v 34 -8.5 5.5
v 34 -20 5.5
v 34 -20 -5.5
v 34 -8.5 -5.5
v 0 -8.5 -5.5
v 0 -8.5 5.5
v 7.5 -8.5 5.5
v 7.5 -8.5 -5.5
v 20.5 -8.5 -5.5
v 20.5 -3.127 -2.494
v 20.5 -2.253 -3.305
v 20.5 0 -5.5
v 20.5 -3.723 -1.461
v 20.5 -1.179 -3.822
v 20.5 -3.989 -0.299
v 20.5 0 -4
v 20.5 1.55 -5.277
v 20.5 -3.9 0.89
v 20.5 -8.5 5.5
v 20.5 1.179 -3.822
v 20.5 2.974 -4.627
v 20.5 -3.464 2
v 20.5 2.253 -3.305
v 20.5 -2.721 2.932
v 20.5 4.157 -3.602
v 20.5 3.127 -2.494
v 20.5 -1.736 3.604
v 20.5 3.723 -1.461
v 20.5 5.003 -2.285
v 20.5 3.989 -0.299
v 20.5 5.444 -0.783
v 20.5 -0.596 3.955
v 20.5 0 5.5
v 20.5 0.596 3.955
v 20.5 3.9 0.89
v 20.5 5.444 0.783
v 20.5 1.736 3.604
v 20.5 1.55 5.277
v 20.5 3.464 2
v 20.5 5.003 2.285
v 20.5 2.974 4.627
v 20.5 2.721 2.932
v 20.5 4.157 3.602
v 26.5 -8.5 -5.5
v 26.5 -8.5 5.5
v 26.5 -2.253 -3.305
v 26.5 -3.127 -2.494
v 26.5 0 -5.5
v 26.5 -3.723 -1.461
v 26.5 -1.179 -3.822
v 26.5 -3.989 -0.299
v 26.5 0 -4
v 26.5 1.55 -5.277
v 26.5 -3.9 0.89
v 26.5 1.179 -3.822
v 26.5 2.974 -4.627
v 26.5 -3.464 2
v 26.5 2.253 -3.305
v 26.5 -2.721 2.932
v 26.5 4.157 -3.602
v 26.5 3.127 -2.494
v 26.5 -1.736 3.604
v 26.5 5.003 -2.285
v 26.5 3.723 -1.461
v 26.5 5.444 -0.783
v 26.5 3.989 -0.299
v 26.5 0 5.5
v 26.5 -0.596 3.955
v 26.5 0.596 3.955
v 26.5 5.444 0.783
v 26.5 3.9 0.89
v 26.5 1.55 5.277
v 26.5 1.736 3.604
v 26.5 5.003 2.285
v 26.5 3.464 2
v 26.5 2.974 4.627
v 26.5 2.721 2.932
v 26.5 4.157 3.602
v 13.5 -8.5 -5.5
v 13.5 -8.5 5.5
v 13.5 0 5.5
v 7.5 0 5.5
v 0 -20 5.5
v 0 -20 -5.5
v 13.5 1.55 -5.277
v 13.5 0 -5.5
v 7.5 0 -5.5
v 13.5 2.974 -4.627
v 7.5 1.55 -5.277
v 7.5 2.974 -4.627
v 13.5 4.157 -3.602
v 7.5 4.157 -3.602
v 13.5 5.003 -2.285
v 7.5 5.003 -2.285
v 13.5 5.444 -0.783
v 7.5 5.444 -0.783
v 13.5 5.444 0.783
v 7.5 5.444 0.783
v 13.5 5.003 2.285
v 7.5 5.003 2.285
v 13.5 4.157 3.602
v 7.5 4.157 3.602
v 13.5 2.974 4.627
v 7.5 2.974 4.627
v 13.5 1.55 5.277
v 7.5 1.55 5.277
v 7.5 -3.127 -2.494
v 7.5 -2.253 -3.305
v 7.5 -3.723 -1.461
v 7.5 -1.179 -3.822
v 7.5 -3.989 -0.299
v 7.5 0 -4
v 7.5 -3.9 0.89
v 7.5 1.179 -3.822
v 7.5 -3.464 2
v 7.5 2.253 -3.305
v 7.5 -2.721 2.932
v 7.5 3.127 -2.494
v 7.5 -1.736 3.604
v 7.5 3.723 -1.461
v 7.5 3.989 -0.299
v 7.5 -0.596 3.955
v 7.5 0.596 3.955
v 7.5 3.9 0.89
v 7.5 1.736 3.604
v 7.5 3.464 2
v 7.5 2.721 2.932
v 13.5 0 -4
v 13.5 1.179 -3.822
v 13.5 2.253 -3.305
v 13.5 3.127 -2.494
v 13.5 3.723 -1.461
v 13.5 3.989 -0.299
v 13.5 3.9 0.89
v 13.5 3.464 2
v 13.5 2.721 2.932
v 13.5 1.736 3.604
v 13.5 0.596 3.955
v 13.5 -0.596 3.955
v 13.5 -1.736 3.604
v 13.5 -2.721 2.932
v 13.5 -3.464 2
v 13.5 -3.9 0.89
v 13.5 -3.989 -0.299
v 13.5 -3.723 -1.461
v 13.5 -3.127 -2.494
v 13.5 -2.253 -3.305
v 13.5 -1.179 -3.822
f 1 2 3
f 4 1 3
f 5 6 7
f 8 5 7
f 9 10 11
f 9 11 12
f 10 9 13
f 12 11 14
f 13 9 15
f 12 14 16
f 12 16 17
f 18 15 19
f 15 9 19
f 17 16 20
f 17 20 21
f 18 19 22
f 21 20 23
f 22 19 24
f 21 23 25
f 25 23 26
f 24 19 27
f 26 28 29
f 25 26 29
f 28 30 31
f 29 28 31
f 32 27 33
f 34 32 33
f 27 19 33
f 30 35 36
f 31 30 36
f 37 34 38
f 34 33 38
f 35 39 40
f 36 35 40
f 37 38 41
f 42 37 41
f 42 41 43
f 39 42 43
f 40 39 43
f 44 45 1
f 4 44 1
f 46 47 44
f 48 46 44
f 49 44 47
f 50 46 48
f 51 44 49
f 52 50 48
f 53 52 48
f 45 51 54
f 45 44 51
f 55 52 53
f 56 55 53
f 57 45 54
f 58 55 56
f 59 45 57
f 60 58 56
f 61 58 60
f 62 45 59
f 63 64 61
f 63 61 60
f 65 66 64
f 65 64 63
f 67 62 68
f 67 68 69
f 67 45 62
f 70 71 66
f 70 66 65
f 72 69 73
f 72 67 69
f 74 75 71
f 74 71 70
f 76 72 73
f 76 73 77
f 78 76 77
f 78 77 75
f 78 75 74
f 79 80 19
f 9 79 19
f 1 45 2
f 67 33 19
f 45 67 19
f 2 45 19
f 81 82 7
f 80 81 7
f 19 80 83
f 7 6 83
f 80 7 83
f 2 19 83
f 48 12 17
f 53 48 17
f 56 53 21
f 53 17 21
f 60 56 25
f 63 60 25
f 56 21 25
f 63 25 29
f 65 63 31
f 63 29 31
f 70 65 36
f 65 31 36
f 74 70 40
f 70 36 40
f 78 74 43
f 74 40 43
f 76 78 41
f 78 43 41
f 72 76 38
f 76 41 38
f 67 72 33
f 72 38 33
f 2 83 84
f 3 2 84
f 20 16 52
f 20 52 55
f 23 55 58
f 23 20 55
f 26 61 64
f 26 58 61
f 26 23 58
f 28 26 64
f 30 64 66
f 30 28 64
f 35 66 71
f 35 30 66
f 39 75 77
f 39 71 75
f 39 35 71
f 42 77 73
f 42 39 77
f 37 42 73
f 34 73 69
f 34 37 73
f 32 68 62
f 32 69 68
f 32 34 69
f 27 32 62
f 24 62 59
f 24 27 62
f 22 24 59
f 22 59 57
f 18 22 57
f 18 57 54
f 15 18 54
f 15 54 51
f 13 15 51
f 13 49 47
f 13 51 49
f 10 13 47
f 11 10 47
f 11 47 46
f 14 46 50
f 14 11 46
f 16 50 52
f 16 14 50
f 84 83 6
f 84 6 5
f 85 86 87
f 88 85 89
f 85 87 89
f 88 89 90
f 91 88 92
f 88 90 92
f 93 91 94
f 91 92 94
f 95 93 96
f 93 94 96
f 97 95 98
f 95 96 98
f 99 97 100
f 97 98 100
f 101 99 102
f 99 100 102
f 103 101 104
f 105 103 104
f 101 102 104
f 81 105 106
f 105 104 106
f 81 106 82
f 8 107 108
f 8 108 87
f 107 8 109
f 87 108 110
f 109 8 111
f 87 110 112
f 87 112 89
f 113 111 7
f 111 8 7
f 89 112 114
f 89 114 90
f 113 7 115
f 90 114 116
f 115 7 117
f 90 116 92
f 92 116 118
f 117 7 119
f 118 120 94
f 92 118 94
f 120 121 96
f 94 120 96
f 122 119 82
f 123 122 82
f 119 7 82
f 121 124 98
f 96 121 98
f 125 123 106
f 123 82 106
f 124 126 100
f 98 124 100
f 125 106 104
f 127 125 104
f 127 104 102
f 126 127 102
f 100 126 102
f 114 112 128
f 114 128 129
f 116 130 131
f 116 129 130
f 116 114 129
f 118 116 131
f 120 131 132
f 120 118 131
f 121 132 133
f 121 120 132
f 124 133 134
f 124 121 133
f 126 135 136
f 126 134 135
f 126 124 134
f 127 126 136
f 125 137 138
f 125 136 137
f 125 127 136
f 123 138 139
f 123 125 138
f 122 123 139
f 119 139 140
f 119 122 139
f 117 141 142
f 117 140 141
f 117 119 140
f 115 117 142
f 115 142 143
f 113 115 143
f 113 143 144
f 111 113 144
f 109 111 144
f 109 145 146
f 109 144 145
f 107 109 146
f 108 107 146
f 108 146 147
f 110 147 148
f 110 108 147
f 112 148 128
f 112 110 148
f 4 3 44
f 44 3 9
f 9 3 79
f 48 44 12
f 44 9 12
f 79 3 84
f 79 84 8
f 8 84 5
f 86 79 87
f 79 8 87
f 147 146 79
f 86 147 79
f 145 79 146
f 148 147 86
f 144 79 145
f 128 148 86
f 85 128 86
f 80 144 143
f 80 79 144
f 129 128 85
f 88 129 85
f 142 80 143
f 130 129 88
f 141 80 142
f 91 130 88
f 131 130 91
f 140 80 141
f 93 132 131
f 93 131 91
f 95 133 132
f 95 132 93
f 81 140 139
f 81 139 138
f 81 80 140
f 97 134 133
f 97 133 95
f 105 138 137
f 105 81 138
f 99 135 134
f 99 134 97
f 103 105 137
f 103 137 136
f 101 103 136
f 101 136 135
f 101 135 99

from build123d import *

# Parameters (mm, degrees)
SKETCH_1_R          = 4
EXTRUDE_1_DEPTH     = 34
SKETCH_2_W          = 7.5
SKETCH_2_H          = 14
SKETCH_2_W_2        = 3.5
CUT_EXTRUDE_2_DEPTH = 41.951190459


with BuildPart() as part:
    # 草图1 → 凸台-拉伸1 (new body)
    with BuildSketch(Plane(origin=(0, 0, 0), x_dir=(0, 0, -1), z_dir=(1, 0, 0))):
        with BuildLine():
            Line((-5.5, 0), (-5.5, -20))
            Line((-5.5, -20), (5.5, -20))
            Line((5.5, -20), (5.5, 0))
            ThreePointArc((5.5, 0), (0, 5.5), (-5.5, 0))
        make_face()
        Circle(SKETCH_1_R, mode=Mode.SUBTRACT)
    extrude(amount=EXTRUDE_1_DEPTH)

    # 草图2 → 切除-拉伸2 (cut, through all)
    with BuildSketch(Plane.XY.offset(5.5)):
        with Locations((3.75, -1.5)):
            Rectangle(SKETCH_2_W, SKETCH_2_H)
        with Locations((18.75, -1.5)):
            Rectangle(SKETCH_2_W_2, SKETCH_2_H)
        with Locations((15.25, -1.5)):
            Rectangle(SKETCH_2_W_2, SKETCH_2_H)
        with Locations((30.25, -1.5)):
            Rectangle(SKETCH_2_W, SKETCH_2_H)
    extrude(amount=-CUT_EXTRUDE_2_DEPTH, mode=Mode.SUBTRACT)


solid = part.part
